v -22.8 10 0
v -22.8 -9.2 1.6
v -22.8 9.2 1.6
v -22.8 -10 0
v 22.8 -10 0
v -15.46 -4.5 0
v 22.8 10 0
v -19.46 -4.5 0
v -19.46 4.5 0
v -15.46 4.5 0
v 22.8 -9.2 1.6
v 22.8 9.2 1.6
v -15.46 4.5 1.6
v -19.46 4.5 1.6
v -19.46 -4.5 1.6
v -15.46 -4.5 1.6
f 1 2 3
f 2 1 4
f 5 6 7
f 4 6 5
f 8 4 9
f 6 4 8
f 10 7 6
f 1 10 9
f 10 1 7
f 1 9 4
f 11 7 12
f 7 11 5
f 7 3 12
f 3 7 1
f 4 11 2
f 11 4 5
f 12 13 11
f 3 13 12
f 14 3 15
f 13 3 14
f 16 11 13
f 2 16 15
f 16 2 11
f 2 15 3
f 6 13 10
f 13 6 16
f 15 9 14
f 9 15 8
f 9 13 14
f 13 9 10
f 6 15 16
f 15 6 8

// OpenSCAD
// board is 43.5 x 18
// pins bottom to top 19mm
bw=18.5;  // board width
bl=44.0;  // board length
oah = 20; // overall height
wt = 1.6; // wall thickness

module pinSilo(pd) {
  difference(){
    cube([2.6,2.6,pd],center=true);
    cube([1,1,pd+0.2],center=true);
  }
}
module dipHoles(numpins=30,wid=15.24,pd=6) {
  hp = numpins/2;
  hw = wid/2;
  xoff = -(hp * 2.54) / 2;
  yoff = hw;
  for(i=[0:hp]) {
    translate([xoff+(i*2.54),-yoff,0]) pinSilo(pd);
    translate([xoff+(i*2.54),yoff,0]) pinSilo(pd);
  }
}
module eqTriPsm(pw,l) {
  hpw=pw/2;
  rotate([0,0,90]) translate ([0,(l/2),0]) rotate([90,0,0]) linear_extrude(l) polygon(points=[[-hpw,0],[hpw,0],[0,pw],[-hpw,0]]);
}
module miniUsbHole(l) {
    // trapazoid bottom 7, hieght 4 top 8
  tbh = 7.5/2;
  tth = 8.5/2;
  th = 4.5;
  rotate([0,0,90]) translate ([0,0,0]) rotate([90,0,0]) linear_extrude(l) polygon(points=[[-tbh,0],[tbh,0],[tth,th],[-tth,th],[-tbh,0]]);
}

module nanoBoxBottom(){
  union() {
    difference(){
      cube([bl+(2*wt),bw+(2*wt),oah+(2*wt)], center=true); // outisde box
      cube([bl,bw,oah+0.01], center=true); // inside clearnace
      translate([wt-0.1,0,oah/2]) eqTriPsm(bw+wt,bl+wt+wt+0.2); //dove tail top
      translate([(bl/2)-0.1,(1/2)]) miniUsbHole(3);// usb connector
    }
    //translate([0,0,(-oah/2)+3]) dipHoles(30,15.24,6);
  }
}
module nanoBoxTop() {
  difference() {
    eqTriPsm(wt+bw-0.1,bl+wt); // main shape
    translate([0,0,wt+(oah/2)]) cube([2*wt+bl+0.1,bw,oah], center=true); // clip top
    translate([(-bl/2)+2.54,-4.5,-0.1]) cube([4,9,2]); //dupont connector hole
  }
}
//nanoBoxBottom();
nanoBoxTop();
//miniUsbHole(3);
